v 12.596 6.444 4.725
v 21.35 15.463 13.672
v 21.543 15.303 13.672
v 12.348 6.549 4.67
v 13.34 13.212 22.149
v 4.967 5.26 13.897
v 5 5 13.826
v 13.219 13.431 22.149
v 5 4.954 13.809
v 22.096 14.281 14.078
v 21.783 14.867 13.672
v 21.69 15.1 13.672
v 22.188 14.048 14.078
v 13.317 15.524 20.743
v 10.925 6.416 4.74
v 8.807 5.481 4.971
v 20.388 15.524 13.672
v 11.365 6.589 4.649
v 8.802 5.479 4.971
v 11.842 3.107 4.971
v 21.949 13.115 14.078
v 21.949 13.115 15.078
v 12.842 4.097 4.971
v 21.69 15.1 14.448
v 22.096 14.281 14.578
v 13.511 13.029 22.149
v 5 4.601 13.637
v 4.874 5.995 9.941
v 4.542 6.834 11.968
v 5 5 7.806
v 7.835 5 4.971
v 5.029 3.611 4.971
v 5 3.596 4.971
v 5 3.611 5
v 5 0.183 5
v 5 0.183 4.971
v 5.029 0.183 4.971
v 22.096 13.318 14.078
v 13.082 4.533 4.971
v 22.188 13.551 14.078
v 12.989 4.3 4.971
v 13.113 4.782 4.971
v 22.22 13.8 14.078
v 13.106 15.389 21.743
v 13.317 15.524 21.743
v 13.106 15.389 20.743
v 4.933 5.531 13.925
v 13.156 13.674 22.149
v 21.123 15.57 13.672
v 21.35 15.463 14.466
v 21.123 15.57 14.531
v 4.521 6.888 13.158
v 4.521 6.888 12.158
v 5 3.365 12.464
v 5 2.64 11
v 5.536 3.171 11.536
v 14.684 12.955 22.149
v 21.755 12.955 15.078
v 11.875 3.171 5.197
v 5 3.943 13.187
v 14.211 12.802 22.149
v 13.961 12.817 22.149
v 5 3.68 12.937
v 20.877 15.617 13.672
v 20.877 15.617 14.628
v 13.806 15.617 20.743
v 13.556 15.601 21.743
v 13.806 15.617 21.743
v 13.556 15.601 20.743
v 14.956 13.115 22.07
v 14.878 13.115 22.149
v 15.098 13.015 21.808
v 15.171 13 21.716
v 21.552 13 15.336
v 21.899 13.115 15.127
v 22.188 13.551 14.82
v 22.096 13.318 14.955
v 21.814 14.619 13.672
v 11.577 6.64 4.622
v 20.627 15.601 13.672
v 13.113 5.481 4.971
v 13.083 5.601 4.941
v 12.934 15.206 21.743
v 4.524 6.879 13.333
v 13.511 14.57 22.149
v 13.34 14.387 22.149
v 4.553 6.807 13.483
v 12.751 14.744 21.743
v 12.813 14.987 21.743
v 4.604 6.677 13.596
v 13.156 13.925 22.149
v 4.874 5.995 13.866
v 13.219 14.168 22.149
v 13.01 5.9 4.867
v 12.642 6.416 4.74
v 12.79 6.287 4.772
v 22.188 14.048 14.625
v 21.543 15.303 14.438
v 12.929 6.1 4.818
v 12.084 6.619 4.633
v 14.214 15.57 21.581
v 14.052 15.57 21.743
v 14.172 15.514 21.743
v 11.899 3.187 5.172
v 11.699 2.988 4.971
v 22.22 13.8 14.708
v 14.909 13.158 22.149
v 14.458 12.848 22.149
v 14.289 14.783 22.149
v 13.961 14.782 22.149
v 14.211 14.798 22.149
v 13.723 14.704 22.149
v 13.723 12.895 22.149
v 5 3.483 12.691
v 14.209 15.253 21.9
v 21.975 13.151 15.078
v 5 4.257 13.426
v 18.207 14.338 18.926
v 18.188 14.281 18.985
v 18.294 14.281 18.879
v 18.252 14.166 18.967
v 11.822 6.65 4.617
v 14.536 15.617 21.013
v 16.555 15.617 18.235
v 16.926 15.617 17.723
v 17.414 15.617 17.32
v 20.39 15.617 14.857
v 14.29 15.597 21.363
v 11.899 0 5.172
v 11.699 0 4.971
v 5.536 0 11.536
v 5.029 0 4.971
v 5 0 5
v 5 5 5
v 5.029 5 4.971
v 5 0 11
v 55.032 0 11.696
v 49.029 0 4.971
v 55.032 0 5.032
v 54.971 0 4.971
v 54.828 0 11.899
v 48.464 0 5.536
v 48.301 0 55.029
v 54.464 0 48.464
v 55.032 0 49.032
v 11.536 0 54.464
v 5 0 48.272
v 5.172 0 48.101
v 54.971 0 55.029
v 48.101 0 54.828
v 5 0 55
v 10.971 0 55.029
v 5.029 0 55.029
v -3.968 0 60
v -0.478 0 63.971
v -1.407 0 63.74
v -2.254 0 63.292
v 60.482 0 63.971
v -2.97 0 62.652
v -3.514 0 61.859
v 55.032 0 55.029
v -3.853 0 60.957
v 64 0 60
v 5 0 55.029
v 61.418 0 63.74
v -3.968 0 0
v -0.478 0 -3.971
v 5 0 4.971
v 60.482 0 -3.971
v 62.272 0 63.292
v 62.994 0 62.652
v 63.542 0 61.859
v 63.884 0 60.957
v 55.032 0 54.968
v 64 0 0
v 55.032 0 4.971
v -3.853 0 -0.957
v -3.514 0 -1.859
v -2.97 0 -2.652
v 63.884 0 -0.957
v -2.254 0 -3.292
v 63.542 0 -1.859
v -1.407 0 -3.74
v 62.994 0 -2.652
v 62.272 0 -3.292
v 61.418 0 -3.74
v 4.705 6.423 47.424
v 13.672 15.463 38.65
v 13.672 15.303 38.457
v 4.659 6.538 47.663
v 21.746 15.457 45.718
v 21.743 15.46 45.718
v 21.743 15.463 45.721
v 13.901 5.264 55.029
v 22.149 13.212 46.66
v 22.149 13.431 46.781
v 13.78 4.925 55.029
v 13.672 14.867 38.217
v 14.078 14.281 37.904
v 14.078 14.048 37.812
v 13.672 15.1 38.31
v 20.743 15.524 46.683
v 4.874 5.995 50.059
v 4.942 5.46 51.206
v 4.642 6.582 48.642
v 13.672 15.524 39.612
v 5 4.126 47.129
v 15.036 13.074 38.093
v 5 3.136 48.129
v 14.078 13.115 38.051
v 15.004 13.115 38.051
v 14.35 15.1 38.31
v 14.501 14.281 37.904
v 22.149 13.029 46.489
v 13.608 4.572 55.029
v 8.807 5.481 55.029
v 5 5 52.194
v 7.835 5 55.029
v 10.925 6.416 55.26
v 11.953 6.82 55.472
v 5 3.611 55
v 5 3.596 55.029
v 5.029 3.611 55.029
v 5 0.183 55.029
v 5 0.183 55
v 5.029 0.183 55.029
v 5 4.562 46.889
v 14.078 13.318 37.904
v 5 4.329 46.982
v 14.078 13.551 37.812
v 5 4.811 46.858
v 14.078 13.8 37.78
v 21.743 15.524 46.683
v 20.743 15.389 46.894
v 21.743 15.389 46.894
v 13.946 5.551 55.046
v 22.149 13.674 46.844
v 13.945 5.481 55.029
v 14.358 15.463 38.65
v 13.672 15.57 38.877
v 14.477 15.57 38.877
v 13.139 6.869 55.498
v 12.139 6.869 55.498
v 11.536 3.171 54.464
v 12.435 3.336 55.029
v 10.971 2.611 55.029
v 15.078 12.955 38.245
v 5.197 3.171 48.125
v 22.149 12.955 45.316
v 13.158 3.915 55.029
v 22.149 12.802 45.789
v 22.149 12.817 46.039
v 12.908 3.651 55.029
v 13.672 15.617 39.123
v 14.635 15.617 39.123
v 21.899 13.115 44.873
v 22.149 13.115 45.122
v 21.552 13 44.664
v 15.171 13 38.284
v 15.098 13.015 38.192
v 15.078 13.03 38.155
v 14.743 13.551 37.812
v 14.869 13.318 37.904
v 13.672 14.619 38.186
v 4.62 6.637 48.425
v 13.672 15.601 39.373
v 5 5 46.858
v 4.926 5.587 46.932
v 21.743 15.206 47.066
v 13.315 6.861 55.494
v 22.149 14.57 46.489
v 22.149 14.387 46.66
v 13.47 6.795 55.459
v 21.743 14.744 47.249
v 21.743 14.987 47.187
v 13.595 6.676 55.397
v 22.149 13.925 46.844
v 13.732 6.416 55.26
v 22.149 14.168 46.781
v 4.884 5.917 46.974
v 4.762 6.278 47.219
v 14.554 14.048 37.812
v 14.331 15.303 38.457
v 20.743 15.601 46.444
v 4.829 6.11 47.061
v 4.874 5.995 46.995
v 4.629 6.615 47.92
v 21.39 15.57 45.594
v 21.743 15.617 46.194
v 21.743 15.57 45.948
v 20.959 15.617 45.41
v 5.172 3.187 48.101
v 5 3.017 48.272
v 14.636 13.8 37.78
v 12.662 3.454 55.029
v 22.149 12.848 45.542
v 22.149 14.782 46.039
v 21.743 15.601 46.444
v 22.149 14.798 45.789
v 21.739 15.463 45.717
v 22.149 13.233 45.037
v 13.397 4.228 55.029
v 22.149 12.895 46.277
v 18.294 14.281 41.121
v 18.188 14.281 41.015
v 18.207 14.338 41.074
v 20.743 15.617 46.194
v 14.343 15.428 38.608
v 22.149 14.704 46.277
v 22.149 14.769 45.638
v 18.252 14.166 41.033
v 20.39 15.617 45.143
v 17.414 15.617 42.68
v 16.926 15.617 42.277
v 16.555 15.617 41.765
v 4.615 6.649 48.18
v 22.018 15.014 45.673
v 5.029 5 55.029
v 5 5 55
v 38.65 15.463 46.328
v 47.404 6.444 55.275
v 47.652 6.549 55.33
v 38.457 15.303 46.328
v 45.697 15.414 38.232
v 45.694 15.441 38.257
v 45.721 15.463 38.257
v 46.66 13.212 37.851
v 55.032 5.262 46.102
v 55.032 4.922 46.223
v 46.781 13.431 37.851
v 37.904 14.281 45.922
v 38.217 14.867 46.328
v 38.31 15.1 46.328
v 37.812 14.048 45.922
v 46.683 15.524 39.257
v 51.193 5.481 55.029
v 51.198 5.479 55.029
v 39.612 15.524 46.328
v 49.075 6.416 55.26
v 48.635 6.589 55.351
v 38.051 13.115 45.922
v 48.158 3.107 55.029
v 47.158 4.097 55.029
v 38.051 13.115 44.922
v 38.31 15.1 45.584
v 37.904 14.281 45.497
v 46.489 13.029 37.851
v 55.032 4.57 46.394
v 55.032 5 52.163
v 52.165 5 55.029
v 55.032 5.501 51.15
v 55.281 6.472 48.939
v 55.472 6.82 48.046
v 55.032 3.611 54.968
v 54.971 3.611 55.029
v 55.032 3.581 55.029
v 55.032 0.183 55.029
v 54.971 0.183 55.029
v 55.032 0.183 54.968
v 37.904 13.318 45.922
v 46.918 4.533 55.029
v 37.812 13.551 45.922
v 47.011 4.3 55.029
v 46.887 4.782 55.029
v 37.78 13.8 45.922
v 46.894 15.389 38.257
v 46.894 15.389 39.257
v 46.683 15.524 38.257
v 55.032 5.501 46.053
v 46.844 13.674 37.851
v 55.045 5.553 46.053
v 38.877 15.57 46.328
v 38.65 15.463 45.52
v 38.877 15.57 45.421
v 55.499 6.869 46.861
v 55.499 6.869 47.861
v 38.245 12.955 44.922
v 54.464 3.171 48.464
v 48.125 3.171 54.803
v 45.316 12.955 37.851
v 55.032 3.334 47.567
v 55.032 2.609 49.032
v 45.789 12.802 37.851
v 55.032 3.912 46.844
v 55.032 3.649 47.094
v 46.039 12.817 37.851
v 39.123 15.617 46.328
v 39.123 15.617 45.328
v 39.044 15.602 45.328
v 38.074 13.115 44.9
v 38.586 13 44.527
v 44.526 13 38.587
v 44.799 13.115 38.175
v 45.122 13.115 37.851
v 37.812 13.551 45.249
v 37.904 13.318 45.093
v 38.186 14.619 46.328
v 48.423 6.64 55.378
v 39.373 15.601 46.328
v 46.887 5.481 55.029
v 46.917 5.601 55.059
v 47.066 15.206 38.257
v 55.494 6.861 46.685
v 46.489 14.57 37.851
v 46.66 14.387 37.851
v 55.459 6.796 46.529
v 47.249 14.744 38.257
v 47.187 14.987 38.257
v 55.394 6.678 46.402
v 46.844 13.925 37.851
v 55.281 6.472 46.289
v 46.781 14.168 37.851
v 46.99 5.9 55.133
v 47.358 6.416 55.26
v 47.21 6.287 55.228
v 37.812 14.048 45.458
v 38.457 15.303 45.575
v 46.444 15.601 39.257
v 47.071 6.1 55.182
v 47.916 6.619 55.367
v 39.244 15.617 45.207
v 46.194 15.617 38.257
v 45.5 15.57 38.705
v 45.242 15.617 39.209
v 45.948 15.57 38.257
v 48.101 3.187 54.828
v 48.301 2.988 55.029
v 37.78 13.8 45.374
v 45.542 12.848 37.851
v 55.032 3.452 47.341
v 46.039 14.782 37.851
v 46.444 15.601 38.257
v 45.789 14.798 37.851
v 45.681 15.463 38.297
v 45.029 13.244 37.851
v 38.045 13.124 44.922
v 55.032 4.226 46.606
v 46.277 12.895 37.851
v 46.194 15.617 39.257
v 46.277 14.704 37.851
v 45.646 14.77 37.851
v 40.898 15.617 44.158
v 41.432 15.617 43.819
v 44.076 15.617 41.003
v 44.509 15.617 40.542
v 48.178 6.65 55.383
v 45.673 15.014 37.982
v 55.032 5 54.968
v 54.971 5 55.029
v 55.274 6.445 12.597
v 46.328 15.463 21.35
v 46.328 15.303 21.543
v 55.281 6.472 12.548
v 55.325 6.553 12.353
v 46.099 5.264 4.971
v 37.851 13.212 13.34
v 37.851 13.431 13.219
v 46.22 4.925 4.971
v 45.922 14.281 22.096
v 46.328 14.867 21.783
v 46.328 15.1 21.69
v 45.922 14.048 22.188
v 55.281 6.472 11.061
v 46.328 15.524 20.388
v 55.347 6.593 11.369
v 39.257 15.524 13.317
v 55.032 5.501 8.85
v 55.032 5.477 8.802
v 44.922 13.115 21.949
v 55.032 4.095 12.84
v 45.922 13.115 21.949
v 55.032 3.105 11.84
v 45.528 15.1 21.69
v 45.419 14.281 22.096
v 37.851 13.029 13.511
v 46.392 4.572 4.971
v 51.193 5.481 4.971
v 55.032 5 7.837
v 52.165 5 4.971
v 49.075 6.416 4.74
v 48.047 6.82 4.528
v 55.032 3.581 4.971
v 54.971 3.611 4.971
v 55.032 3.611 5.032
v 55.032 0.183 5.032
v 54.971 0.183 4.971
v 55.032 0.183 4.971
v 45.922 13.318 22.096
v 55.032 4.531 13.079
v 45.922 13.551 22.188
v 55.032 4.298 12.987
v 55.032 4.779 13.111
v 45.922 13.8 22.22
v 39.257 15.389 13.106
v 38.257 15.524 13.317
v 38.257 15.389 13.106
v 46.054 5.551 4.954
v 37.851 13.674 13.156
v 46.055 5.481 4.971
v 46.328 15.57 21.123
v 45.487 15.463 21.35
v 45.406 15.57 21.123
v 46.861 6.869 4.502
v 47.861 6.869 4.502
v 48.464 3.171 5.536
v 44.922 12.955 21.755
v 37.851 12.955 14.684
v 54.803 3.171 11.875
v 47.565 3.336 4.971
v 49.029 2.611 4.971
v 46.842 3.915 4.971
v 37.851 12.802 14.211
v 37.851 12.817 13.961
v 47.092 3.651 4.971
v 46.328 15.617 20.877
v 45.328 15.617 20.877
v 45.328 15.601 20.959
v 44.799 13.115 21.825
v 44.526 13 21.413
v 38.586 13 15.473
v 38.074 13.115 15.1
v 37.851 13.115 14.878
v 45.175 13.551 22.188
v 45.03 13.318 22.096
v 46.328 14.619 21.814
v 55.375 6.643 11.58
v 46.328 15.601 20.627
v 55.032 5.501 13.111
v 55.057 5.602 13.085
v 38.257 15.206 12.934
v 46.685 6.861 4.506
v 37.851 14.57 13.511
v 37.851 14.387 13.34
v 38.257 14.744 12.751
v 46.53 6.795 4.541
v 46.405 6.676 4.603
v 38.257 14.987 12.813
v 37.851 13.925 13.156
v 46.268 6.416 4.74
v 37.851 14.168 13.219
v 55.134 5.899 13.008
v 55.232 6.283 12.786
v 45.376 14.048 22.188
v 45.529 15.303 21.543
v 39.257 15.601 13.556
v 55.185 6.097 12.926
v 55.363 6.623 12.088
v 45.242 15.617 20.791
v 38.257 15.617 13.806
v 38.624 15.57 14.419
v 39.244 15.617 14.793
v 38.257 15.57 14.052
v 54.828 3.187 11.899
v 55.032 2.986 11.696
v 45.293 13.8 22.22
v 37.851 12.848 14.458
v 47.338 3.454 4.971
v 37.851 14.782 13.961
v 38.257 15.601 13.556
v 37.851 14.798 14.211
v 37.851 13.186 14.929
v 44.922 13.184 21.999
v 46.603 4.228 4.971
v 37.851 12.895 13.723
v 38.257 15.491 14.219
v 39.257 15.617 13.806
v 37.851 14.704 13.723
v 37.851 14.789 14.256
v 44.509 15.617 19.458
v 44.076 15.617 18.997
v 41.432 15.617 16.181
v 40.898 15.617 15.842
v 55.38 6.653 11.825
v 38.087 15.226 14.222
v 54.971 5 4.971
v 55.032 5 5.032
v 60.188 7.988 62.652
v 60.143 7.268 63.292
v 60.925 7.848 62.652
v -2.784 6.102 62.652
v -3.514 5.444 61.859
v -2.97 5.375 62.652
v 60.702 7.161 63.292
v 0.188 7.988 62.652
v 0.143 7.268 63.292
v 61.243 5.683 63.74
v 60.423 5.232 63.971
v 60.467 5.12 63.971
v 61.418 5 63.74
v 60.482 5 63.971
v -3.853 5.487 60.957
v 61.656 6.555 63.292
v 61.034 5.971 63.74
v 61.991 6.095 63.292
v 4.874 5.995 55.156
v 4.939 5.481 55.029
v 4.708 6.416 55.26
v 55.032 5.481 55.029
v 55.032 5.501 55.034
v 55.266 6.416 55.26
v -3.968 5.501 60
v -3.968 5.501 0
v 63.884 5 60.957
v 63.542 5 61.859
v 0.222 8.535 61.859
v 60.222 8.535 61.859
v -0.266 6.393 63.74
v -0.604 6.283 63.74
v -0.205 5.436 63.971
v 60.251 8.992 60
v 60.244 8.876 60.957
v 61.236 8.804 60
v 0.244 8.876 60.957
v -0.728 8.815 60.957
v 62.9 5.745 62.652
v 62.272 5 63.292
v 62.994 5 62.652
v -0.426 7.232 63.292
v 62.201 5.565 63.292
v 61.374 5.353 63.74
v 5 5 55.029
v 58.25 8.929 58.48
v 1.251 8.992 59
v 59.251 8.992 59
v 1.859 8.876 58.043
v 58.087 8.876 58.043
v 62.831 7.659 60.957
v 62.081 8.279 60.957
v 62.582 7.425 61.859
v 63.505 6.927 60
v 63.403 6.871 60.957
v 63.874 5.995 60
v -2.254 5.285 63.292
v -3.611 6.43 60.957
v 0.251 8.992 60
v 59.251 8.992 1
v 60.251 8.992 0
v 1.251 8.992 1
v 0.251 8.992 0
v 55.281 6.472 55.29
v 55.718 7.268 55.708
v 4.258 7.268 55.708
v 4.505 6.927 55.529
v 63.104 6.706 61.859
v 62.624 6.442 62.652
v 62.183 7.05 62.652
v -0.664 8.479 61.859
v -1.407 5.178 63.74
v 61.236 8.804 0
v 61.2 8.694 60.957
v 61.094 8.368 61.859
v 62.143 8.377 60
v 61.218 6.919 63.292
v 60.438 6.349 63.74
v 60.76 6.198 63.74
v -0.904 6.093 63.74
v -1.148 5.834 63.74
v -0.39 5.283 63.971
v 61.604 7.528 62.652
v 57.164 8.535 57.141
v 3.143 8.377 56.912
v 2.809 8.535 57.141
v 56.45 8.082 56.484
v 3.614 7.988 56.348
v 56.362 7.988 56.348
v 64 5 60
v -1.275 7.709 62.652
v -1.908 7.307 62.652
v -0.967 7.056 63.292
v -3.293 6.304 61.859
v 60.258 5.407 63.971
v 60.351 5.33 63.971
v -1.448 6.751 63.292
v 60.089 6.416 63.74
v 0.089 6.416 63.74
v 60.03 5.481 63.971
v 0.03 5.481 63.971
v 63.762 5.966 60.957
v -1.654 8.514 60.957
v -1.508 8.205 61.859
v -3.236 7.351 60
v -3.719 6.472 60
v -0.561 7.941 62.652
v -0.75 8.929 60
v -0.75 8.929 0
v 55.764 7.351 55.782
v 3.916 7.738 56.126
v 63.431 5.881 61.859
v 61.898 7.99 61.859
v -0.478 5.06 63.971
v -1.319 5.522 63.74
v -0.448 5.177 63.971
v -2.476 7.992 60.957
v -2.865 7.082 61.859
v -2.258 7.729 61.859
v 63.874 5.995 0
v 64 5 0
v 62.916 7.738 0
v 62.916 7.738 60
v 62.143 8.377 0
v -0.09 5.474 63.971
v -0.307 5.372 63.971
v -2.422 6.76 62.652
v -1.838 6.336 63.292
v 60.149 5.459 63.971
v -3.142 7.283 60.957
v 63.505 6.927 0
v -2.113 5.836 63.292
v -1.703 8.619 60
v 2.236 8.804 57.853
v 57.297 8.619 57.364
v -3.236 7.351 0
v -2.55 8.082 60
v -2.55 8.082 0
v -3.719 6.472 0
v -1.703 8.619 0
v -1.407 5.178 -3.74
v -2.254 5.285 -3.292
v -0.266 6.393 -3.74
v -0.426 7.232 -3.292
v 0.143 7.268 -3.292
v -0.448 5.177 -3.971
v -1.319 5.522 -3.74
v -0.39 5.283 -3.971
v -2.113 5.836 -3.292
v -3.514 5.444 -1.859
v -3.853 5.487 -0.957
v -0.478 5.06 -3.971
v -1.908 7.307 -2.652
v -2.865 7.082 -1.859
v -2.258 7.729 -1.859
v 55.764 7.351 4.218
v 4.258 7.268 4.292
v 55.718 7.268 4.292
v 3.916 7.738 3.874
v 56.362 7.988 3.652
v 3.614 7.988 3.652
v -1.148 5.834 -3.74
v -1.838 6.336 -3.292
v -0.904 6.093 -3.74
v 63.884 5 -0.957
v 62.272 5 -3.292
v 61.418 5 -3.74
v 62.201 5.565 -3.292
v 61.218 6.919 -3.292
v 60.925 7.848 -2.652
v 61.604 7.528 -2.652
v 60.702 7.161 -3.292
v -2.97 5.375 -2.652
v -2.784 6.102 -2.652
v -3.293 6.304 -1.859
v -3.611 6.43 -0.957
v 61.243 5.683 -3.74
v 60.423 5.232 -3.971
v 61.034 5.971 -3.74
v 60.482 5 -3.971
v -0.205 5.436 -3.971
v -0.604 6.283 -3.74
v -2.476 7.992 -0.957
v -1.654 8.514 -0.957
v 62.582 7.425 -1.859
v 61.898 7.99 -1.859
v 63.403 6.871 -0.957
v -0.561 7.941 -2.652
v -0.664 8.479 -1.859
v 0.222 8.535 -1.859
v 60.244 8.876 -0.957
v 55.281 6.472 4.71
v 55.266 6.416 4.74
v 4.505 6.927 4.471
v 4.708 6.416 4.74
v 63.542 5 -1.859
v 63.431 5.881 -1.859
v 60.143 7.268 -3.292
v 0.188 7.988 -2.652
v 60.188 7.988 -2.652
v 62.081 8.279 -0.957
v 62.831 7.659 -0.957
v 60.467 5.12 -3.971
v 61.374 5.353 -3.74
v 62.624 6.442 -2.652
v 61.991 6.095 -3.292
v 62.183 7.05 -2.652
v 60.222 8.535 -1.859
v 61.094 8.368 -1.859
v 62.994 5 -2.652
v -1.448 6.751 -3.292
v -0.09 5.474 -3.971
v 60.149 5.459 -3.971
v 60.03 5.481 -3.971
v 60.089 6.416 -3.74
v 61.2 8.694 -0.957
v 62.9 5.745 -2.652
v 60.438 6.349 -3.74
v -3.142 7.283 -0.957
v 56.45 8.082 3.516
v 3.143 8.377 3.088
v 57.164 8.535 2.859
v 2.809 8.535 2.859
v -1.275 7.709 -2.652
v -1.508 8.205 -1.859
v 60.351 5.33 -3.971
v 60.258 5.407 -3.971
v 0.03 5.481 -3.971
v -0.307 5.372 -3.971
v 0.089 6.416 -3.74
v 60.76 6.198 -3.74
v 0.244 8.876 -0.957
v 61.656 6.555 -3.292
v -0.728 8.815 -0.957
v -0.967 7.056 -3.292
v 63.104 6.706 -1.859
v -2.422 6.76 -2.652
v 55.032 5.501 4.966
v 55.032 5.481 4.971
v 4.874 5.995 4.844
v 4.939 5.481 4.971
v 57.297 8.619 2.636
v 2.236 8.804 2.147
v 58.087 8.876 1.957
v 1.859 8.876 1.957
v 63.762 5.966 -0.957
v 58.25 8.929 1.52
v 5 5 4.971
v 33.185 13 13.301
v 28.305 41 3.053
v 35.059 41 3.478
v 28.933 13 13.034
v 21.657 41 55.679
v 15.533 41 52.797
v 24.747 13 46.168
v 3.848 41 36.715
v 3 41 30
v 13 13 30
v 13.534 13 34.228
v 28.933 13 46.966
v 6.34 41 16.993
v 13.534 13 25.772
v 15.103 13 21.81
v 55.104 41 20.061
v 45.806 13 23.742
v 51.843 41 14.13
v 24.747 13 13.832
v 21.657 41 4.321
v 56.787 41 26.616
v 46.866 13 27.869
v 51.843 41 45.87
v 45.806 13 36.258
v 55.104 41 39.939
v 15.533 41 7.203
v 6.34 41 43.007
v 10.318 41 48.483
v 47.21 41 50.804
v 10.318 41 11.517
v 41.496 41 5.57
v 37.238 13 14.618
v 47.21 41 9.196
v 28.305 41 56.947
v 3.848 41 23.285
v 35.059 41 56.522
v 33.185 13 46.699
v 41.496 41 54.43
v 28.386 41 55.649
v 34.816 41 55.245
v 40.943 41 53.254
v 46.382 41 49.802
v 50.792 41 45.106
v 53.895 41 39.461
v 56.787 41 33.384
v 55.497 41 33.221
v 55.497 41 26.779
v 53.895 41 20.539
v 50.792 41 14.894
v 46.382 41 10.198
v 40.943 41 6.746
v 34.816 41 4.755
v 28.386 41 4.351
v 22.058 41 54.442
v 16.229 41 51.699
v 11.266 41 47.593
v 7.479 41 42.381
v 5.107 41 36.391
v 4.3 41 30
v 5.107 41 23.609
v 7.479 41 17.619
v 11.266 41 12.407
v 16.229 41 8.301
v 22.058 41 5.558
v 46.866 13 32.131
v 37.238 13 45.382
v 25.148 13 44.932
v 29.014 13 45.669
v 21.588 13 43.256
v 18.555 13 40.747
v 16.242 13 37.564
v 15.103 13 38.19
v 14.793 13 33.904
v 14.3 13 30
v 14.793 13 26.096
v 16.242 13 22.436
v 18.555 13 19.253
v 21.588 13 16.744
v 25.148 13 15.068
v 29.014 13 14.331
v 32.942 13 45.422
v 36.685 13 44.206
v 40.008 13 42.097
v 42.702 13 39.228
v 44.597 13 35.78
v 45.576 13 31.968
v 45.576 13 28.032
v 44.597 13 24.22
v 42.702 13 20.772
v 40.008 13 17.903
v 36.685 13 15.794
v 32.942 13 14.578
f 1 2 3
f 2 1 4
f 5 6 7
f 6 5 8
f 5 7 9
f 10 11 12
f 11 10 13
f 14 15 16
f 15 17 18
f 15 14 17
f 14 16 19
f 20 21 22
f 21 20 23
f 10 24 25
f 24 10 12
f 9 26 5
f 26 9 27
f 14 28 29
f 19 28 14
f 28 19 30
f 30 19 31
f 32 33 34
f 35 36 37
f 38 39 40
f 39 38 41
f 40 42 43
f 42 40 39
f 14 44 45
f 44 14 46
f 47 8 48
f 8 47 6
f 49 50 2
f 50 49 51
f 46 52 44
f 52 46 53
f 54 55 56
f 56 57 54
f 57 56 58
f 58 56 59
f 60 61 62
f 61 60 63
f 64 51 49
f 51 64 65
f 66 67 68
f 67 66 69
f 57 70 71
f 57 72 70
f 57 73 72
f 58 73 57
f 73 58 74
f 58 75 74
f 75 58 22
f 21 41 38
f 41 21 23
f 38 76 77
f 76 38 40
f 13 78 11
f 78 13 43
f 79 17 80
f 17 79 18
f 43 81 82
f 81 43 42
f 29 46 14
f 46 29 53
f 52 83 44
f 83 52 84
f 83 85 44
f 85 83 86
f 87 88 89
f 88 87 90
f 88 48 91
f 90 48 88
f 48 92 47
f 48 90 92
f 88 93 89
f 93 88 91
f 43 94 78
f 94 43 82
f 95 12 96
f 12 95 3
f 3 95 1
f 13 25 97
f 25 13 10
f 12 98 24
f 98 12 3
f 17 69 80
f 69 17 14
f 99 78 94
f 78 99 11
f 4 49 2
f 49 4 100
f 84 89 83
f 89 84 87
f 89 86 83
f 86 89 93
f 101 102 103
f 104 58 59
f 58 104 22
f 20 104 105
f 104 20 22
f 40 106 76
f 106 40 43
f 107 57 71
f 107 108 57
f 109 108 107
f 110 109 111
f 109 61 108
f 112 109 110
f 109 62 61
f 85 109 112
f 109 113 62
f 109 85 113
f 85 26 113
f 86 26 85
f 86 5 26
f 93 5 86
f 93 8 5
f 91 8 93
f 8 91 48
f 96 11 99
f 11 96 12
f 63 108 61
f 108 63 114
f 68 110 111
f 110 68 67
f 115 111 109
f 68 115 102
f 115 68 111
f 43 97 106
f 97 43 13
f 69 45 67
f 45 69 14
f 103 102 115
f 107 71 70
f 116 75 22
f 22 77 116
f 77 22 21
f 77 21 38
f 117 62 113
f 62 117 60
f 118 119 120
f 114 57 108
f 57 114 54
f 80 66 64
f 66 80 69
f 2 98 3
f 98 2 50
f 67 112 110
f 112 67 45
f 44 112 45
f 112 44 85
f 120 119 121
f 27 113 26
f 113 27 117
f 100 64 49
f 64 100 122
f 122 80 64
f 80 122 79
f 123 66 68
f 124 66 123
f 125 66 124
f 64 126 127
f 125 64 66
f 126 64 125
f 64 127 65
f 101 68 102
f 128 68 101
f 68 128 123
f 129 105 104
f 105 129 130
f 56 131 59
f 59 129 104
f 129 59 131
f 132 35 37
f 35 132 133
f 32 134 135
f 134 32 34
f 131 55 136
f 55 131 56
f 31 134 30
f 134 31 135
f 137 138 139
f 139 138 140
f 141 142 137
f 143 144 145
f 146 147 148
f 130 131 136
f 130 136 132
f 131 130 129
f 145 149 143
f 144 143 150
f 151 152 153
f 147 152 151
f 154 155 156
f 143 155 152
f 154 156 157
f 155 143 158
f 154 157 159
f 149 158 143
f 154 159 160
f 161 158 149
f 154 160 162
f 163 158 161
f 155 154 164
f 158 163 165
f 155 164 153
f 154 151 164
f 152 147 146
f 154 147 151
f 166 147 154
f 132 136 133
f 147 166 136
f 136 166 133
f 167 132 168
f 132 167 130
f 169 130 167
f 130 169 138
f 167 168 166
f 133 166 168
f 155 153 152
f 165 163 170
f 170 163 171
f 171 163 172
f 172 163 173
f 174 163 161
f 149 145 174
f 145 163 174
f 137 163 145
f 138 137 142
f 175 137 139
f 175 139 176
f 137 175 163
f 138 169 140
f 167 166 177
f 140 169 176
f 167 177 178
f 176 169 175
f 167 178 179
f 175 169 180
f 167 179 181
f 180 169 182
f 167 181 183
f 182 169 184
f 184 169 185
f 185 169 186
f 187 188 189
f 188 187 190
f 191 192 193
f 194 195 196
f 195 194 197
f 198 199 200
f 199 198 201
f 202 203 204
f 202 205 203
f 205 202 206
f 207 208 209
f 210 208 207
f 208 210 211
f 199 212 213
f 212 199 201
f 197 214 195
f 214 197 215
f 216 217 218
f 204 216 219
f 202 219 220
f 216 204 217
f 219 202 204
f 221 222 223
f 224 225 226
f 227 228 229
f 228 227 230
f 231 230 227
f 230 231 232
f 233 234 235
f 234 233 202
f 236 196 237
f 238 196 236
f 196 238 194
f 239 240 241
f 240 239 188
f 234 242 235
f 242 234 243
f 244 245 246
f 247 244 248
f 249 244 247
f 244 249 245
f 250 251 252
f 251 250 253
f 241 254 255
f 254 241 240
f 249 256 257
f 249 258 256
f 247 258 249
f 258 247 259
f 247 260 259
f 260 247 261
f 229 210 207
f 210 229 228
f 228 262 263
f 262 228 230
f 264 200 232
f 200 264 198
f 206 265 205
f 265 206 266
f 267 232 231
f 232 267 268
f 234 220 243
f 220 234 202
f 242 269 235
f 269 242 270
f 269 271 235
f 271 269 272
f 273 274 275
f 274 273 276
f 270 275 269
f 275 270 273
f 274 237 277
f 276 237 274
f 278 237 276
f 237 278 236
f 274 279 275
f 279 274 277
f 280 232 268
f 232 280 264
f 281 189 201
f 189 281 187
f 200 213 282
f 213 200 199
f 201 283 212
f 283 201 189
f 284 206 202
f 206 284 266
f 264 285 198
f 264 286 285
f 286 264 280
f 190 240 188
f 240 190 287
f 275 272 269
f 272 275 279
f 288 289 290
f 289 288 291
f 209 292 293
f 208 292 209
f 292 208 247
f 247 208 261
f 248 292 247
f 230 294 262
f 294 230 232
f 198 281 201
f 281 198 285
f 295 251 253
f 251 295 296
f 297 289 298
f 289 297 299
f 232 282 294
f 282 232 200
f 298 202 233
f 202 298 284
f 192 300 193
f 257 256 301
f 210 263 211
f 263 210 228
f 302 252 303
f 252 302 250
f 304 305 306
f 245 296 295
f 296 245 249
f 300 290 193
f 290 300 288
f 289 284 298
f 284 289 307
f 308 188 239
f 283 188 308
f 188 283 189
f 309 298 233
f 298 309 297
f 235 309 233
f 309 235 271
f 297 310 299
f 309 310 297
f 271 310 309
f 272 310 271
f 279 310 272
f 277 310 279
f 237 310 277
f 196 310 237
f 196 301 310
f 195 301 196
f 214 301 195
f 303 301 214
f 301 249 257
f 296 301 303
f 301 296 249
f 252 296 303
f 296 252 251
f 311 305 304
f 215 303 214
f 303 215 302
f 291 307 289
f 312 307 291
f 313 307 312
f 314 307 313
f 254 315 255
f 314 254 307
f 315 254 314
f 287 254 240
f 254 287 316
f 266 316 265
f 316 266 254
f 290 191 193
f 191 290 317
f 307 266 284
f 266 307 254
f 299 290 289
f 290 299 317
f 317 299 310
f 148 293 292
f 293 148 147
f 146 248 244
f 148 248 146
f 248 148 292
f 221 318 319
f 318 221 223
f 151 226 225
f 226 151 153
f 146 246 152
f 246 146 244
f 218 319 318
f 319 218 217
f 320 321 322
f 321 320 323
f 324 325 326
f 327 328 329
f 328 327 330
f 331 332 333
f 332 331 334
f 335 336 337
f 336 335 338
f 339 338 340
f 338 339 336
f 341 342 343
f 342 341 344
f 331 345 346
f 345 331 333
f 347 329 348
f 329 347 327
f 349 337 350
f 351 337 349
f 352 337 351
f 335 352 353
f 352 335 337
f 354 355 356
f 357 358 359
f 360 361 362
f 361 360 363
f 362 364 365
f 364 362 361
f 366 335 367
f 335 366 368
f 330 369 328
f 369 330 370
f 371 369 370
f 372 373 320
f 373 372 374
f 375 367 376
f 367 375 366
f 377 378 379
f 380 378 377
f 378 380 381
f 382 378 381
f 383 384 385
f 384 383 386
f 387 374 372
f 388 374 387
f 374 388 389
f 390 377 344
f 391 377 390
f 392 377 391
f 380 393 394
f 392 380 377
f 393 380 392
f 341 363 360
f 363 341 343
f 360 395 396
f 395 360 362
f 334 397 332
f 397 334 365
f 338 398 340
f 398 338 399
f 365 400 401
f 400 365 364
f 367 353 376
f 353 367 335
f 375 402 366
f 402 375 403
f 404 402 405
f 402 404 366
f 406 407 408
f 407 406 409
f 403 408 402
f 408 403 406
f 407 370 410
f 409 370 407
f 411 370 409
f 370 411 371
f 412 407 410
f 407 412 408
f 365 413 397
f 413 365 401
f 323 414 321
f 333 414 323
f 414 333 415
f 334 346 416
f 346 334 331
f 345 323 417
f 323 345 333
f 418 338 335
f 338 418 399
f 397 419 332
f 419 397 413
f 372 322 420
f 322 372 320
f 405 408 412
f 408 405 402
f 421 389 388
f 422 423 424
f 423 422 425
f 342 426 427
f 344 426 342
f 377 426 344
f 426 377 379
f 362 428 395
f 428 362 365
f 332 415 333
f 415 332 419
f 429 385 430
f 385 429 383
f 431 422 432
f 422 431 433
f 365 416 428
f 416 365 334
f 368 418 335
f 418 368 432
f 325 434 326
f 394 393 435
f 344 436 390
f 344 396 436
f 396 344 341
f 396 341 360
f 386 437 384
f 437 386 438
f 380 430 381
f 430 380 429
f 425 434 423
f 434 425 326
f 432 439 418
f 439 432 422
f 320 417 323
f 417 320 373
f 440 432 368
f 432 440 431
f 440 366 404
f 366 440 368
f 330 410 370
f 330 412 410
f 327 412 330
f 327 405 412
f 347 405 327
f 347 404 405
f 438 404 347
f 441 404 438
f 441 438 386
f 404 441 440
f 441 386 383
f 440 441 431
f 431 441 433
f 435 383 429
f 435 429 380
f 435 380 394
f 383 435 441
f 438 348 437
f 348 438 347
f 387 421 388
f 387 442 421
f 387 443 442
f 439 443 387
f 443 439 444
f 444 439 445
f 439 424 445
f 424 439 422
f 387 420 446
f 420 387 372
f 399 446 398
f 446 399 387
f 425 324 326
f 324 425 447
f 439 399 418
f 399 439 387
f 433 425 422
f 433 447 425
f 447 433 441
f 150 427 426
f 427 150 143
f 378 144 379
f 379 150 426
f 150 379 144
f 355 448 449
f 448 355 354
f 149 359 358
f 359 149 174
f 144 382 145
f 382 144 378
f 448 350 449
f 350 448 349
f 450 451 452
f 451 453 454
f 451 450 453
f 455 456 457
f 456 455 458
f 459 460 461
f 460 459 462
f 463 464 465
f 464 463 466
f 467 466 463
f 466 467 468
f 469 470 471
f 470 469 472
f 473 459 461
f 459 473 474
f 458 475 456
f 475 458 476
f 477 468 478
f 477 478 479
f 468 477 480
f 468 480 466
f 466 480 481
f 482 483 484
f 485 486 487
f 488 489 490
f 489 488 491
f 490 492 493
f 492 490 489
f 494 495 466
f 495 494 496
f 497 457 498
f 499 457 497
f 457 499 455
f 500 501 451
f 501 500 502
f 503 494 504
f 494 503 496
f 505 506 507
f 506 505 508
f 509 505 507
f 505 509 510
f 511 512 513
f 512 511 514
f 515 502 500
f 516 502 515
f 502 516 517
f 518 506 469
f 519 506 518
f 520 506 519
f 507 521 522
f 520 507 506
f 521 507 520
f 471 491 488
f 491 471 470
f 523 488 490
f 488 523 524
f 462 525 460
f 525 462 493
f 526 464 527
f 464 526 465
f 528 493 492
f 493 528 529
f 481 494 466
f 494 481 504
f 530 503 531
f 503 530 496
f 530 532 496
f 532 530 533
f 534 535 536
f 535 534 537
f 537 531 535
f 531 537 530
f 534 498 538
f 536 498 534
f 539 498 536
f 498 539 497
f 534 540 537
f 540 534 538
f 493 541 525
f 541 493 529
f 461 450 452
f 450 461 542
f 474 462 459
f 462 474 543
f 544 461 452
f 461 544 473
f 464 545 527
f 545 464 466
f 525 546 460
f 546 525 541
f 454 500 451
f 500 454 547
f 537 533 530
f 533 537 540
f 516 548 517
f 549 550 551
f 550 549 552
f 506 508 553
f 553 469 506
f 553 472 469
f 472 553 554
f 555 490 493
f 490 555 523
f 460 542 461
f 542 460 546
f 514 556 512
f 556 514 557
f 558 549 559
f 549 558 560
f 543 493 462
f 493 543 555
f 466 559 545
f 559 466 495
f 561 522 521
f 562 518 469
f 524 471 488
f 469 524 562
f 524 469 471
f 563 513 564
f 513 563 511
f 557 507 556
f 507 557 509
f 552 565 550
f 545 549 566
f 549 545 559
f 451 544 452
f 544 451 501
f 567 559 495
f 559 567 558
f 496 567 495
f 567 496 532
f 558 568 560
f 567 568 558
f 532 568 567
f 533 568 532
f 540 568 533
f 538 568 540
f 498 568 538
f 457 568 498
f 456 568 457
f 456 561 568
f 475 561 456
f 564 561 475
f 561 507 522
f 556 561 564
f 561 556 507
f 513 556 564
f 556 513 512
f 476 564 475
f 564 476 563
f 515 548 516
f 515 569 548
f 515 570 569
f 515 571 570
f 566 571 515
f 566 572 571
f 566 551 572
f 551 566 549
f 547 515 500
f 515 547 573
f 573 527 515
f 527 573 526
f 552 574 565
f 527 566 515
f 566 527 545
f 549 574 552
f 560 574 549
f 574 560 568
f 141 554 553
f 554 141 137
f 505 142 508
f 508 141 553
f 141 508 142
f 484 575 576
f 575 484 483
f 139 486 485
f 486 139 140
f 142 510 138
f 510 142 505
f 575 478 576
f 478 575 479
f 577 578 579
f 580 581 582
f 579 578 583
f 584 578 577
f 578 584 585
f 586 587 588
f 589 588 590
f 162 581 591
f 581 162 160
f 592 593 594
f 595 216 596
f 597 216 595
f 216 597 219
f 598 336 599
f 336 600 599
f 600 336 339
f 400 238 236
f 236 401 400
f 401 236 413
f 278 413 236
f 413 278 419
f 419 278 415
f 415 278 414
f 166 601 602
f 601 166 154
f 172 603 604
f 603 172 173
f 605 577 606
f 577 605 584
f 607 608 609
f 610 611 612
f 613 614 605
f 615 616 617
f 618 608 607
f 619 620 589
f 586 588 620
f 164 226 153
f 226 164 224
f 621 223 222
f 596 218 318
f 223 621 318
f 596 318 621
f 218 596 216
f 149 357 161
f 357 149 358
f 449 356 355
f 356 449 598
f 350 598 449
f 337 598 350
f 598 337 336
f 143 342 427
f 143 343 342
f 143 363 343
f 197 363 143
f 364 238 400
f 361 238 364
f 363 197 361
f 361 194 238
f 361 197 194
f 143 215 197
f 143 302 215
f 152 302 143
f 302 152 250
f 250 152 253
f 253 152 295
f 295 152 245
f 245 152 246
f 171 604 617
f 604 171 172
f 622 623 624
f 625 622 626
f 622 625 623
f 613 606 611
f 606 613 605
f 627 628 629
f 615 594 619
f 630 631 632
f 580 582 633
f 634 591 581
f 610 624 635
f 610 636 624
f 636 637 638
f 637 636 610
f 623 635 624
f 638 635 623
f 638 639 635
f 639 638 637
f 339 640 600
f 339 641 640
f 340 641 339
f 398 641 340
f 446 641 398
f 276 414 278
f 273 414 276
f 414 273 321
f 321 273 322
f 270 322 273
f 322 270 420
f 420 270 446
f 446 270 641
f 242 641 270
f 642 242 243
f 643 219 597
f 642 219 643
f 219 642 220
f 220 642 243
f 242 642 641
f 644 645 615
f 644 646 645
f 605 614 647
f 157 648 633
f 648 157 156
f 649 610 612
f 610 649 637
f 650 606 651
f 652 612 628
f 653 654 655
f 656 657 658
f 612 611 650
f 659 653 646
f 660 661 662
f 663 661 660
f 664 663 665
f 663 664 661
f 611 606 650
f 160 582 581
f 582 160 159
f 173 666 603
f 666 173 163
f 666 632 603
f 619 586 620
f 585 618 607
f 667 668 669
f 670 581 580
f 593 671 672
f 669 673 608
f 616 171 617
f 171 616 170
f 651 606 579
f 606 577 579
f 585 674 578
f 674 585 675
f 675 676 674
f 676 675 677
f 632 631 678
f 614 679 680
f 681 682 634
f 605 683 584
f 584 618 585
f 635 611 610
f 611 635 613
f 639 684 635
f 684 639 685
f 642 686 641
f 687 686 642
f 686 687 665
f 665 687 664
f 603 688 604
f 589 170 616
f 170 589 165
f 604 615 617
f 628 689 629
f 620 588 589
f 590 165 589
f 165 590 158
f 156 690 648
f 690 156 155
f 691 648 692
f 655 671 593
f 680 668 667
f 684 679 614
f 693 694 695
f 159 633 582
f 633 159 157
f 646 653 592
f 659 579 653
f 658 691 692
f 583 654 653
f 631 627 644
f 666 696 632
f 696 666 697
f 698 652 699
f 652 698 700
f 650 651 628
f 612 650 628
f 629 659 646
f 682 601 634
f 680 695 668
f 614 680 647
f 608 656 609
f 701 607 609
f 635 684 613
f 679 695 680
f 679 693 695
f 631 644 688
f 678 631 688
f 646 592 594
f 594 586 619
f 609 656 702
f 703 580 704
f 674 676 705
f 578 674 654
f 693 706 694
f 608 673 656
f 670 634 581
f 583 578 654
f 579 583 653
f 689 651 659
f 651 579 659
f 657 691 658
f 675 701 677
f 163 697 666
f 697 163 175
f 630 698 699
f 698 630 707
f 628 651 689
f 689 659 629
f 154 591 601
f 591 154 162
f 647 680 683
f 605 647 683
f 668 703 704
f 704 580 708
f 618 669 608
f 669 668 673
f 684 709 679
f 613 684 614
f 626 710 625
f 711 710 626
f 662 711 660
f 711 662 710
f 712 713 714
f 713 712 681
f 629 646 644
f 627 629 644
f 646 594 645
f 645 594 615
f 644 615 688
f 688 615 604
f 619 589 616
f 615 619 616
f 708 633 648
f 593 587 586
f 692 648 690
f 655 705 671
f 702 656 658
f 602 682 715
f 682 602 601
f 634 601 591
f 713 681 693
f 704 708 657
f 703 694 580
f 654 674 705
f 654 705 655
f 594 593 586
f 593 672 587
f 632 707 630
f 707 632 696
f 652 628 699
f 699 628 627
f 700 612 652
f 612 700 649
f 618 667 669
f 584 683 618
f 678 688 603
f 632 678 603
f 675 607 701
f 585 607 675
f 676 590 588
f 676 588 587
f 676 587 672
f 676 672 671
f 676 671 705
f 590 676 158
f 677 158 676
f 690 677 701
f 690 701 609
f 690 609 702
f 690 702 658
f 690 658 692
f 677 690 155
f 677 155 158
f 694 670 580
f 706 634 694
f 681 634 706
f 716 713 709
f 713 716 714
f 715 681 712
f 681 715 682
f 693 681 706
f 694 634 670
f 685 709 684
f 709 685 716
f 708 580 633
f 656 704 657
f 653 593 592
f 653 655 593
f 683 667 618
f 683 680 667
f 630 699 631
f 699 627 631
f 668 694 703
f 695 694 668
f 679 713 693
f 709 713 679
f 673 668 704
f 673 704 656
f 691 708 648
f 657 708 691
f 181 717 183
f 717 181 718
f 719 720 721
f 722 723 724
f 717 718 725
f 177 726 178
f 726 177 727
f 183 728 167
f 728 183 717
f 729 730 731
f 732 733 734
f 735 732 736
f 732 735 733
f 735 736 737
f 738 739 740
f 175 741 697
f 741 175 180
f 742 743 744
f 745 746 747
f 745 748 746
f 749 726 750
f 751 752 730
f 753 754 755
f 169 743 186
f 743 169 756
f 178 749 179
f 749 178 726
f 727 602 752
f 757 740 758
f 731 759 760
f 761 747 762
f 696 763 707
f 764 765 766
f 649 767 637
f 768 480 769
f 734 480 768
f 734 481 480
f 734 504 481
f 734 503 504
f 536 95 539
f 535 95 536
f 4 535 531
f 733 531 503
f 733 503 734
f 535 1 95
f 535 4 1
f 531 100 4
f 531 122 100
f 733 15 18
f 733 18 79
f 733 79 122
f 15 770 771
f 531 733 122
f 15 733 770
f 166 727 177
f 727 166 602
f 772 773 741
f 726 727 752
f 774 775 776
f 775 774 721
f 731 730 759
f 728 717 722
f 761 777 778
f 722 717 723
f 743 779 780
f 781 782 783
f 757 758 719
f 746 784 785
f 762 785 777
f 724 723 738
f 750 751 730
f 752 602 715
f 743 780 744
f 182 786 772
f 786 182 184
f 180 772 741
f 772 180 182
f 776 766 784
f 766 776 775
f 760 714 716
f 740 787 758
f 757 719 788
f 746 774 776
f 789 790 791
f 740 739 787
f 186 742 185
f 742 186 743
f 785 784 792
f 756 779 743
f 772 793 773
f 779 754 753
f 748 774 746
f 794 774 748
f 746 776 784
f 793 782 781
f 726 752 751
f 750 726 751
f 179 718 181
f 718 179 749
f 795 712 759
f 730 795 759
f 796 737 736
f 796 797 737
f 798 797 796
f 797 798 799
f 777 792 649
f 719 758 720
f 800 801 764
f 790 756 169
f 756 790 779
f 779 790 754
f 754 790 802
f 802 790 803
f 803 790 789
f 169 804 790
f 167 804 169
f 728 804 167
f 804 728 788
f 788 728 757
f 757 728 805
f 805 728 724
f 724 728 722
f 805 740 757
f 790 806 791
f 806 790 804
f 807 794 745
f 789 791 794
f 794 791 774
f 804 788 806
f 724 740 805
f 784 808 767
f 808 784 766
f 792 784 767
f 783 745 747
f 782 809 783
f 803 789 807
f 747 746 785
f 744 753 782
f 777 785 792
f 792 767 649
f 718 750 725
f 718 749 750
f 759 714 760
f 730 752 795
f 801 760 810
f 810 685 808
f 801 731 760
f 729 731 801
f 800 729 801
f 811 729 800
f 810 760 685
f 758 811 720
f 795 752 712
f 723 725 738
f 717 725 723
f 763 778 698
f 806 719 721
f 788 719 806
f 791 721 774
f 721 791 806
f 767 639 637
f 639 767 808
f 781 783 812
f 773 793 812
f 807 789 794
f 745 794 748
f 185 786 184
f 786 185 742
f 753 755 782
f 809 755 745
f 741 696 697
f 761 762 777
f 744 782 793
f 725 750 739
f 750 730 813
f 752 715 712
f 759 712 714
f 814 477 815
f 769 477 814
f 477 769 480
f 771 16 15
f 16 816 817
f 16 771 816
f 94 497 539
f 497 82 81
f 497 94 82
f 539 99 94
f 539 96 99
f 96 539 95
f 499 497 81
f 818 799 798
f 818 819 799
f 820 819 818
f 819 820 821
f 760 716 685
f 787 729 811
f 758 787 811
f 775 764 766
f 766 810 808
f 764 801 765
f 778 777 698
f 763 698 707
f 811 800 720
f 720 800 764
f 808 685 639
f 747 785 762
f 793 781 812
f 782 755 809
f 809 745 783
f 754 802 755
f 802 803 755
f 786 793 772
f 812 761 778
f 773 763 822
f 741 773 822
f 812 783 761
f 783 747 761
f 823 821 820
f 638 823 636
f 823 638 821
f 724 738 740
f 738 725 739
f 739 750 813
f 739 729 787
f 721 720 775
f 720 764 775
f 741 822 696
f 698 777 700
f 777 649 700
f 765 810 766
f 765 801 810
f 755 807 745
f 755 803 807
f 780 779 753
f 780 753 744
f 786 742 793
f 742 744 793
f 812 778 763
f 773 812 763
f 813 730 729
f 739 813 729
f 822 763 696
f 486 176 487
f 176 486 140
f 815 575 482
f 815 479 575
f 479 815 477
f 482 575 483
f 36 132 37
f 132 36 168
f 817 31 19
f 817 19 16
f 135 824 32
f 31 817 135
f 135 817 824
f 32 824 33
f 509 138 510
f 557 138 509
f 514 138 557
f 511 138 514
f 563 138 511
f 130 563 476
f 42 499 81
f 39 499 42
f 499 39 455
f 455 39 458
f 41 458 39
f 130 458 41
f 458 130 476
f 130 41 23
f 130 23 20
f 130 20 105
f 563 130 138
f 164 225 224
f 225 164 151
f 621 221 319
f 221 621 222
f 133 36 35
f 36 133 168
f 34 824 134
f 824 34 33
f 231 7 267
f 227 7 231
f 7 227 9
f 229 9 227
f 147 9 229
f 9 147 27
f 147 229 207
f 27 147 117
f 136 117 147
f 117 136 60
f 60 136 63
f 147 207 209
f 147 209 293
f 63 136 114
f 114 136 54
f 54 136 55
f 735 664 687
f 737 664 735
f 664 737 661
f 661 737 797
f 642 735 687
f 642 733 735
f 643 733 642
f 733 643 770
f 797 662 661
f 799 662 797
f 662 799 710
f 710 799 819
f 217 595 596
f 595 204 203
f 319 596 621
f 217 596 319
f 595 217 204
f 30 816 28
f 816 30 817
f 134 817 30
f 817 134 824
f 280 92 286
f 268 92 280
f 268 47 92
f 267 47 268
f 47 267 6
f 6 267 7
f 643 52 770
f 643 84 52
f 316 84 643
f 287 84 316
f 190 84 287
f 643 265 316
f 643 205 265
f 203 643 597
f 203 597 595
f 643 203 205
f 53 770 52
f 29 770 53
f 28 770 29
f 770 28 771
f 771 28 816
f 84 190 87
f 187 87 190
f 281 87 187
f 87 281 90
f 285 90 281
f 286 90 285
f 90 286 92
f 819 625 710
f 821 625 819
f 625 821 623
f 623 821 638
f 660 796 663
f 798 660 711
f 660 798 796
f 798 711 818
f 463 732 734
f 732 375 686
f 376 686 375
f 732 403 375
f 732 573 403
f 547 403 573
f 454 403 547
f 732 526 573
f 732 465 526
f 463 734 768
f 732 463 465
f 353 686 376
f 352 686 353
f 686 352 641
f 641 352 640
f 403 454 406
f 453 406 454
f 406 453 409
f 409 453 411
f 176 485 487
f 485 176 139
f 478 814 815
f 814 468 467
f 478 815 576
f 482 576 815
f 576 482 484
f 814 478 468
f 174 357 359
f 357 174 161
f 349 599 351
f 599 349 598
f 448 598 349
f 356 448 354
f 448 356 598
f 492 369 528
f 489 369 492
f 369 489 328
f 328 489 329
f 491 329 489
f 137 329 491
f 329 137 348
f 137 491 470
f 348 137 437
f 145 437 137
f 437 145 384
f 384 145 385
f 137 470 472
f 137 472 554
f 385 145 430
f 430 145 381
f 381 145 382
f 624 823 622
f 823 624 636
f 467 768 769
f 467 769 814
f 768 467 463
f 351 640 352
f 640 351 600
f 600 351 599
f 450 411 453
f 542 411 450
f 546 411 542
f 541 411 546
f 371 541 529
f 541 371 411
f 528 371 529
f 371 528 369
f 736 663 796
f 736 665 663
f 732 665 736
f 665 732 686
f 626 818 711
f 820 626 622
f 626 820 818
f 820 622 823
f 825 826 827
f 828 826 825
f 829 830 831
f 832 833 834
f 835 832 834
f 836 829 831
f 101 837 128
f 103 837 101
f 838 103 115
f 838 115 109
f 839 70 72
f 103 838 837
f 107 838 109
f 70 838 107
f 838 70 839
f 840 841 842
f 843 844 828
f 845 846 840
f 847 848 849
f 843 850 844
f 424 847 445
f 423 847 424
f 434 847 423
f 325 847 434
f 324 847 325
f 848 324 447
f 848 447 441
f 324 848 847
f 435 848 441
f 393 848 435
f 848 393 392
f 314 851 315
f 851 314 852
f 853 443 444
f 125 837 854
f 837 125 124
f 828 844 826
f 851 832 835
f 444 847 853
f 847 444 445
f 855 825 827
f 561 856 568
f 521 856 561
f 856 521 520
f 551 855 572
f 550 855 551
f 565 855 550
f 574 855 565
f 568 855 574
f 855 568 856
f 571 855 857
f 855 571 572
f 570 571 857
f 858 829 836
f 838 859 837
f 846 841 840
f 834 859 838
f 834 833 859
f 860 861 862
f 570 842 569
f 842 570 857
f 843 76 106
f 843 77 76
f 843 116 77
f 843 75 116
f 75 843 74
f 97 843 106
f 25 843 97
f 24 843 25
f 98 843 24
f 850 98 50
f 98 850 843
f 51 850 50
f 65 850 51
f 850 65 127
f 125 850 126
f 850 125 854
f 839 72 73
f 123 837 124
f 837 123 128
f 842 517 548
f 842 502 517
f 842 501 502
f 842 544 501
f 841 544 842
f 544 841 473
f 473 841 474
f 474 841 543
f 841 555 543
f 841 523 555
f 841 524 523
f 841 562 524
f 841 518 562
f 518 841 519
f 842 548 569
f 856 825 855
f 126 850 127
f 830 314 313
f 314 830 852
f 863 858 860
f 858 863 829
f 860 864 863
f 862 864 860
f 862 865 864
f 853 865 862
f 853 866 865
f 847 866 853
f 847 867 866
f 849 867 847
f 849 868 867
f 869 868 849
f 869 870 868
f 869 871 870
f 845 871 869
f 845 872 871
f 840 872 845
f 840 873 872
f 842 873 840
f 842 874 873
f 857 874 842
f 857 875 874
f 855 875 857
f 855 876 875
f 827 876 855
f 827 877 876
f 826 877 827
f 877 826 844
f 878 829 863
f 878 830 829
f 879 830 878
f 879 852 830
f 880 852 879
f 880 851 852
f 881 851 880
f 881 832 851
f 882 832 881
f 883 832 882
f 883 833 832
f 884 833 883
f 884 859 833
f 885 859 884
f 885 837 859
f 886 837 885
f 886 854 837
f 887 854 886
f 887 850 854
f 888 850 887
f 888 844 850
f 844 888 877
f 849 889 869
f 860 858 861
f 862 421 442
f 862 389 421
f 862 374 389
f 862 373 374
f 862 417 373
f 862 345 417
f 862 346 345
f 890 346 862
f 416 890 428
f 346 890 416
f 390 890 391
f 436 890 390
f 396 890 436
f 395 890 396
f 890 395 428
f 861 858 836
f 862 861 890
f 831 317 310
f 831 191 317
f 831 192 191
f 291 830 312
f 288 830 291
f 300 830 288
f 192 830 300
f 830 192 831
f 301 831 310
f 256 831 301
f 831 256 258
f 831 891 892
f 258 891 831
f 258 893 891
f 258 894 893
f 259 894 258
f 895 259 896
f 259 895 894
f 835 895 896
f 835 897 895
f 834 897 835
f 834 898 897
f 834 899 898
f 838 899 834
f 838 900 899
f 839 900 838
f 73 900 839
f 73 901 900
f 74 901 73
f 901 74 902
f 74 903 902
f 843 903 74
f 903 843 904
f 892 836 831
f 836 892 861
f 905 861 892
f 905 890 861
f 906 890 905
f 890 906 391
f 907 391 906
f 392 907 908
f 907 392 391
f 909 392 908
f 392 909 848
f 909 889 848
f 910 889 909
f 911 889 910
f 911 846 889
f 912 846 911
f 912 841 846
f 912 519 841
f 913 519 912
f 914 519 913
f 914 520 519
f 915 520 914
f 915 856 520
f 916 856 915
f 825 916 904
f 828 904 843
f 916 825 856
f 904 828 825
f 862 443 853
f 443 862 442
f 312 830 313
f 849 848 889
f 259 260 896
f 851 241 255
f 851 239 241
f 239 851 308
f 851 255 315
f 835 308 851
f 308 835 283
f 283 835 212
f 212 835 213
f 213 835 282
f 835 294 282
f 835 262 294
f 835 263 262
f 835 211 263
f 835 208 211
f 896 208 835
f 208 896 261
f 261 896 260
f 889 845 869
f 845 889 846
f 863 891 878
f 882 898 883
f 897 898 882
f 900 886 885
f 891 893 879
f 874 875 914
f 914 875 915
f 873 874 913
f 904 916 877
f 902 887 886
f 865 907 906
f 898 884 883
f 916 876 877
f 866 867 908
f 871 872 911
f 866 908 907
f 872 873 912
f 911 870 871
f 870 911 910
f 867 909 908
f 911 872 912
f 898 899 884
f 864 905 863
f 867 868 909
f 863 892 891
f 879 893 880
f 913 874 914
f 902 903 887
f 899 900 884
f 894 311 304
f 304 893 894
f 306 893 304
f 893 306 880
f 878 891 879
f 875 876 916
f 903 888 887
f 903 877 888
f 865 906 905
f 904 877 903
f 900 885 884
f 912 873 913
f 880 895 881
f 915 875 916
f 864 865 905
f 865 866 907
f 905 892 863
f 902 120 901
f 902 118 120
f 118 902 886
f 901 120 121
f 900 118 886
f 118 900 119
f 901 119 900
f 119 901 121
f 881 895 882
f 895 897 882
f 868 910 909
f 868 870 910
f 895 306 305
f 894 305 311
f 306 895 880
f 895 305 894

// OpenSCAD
$fn=25;
module holder() {

    minkowski()
    {
        translate([1,2,8]) rotate([55,45]) cube([10,22,1]);
        cylinder(h=1, r=1);
    }
     translate([2,0,8]) rotate([0,45,0]) cube([9,5,5]);
}

union() {
    holder();
    
    translate([0,0,60]) rotate([0,90,0]) holder();

    translate([60,0,60]) rotate([0,180,0]) holder();

    translate([60,0,0]) rotate([0,270,0]) holder();

    minkowski()
    {
        difference() {
            cube([60,5,60]);
            translate([1,0,1]) cube([58,5,58]);
        }
        difference() {
            sphere(r=4);
            translate([-5,-7.5,-5]) cube([10,7.5,10]);
        }
    }
    
    difference() {
        translate([30,13,30]) rotate([90,0,180]) cylinder(h=28, r1=17, r2=27);
        translate([30,13,30]) rotate([90,0,180]) cylinder(h=28, r1=15.7, r2=25.7);
    }
}
